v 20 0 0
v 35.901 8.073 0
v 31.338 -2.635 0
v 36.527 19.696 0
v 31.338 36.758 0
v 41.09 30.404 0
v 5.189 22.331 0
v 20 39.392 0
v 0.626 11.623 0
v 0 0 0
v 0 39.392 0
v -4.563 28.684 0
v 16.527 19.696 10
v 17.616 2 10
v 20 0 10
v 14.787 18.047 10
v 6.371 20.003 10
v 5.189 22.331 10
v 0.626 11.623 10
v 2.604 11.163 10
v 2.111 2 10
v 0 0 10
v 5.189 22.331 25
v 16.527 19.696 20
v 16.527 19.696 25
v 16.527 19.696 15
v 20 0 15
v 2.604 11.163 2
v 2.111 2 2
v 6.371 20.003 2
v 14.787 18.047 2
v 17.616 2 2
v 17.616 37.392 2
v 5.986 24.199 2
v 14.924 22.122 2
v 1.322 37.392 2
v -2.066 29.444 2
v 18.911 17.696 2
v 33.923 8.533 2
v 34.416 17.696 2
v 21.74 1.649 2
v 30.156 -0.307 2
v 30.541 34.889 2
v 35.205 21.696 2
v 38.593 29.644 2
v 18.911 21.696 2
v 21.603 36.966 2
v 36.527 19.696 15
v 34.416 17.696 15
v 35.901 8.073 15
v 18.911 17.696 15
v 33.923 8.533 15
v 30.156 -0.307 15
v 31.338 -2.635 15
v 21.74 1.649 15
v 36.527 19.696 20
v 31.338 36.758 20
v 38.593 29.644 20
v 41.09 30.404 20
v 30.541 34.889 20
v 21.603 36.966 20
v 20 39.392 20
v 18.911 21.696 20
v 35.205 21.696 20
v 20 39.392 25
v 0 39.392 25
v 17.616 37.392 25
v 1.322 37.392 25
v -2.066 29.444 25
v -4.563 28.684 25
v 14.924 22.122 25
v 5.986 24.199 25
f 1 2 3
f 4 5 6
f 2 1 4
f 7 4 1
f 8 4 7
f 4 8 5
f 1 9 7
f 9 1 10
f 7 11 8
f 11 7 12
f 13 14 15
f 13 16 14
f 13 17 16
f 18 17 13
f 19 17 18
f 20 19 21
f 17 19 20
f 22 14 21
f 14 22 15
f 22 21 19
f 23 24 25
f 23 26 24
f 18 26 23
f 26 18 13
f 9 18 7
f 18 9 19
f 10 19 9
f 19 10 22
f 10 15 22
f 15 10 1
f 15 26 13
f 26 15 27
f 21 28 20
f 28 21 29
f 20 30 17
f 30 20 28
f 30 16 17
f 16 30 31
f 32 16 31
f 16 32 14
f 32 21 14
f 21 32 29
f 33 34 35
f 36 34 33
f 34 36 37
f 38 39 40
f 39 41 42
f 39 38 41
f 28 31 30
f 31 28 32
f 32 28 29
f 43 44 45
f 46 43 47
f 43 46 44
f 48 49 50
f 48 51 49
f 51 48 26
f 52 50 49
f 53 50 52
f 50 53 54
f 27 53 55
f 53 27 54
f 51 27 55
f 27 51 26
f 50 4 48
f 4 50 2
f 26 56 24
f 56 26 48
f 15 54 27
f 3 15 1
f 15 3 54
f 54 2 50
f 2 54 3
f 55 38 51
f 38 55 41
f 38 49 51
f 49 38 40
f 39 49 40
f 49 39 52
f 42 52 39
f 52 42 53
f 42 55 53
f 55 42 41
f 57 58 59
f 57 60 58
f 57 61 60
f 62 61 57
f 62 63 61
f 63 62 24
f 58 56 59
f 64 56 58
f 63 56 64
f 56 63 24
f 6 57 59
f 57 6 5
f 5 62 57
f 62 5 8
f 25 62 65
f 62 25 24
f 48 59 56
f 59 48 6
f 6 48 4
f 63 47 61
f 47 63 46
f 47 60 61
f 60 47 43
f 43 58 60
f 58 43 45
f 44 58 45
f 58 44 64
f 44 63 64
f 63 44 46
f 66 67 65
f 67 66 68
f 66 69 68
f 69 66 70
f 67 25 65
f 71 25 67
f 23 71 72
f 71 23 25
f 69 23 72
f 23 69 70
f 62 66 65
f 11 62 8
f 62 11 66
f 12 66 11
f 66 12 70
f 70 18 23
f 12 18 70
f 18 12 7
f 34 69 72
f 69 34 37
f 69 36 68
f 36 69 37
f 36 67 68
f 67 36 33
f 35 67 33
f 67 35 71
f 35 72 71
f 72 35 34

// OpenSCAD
// file: Type6-tiles.scad
use <../lib/tile_fns-v19.scad>


/* Type 6 
   Kershner 1968
   
   a=d=e
   b=c
   B+D=180
   2B=E
   
   parameters : B
   
     B = 1,29 concave, 30-90 convex, 91-141 concave

   solution by trig
   
*/

function Type6(B) =
    let(a=2*sin(B/2)/sqrt(1+4*cos(B/2)*cos(B/2) - 4*cos(B/2)*cos(3*B/2)))
    let(gamma = asin(a*sin(3*B/2)/(2*sin(B/2))))
    let(C= 90 + gamma)    
    [[1,B],[1,C],[a,180-B],[a,2*B],[a,360-2*B-C]];

function Type6_tiles(B,n,m)=
let(peri=Type6(B))
let(tile=peri_to_tile(peri))

let(assembly = [
    [[0,0]],
    [[0,1],[0,1]],
    [[0,1],[1,0]],
    [[0,0],[2,0]]
    ])
let(unit = group_tiles([tile],assembly))

let(dy=tile_offset(unit,[0,0],[3,1]))
let(dx=tile_offset(unit,[0,4],[1,4]))

tesselate_tiles(unit,n,m,dx,dy);
// main file
use <../lib/tile_fns-v19.scad>
use <../pentagonal-tiles/Type6-tiles.scad>

scale=20;
inset=2;
n=1;
m=1;
B=80;
tiles =Type6_tiles(B,n,m);
echo(tiles);
ftiles=scale_tiles(flatten(tiles),scale);

for (i=[0:len(ftiles)-1]) {
    tile = ftiles[i];
    linear_extrude(height=10+i*5)
       difference() {
           fill_tile(tile);
           fill_tile(inset_tile(tile,inset));
       }
    linear_extrude(height=2)
       fill_tile(tile); 
}
